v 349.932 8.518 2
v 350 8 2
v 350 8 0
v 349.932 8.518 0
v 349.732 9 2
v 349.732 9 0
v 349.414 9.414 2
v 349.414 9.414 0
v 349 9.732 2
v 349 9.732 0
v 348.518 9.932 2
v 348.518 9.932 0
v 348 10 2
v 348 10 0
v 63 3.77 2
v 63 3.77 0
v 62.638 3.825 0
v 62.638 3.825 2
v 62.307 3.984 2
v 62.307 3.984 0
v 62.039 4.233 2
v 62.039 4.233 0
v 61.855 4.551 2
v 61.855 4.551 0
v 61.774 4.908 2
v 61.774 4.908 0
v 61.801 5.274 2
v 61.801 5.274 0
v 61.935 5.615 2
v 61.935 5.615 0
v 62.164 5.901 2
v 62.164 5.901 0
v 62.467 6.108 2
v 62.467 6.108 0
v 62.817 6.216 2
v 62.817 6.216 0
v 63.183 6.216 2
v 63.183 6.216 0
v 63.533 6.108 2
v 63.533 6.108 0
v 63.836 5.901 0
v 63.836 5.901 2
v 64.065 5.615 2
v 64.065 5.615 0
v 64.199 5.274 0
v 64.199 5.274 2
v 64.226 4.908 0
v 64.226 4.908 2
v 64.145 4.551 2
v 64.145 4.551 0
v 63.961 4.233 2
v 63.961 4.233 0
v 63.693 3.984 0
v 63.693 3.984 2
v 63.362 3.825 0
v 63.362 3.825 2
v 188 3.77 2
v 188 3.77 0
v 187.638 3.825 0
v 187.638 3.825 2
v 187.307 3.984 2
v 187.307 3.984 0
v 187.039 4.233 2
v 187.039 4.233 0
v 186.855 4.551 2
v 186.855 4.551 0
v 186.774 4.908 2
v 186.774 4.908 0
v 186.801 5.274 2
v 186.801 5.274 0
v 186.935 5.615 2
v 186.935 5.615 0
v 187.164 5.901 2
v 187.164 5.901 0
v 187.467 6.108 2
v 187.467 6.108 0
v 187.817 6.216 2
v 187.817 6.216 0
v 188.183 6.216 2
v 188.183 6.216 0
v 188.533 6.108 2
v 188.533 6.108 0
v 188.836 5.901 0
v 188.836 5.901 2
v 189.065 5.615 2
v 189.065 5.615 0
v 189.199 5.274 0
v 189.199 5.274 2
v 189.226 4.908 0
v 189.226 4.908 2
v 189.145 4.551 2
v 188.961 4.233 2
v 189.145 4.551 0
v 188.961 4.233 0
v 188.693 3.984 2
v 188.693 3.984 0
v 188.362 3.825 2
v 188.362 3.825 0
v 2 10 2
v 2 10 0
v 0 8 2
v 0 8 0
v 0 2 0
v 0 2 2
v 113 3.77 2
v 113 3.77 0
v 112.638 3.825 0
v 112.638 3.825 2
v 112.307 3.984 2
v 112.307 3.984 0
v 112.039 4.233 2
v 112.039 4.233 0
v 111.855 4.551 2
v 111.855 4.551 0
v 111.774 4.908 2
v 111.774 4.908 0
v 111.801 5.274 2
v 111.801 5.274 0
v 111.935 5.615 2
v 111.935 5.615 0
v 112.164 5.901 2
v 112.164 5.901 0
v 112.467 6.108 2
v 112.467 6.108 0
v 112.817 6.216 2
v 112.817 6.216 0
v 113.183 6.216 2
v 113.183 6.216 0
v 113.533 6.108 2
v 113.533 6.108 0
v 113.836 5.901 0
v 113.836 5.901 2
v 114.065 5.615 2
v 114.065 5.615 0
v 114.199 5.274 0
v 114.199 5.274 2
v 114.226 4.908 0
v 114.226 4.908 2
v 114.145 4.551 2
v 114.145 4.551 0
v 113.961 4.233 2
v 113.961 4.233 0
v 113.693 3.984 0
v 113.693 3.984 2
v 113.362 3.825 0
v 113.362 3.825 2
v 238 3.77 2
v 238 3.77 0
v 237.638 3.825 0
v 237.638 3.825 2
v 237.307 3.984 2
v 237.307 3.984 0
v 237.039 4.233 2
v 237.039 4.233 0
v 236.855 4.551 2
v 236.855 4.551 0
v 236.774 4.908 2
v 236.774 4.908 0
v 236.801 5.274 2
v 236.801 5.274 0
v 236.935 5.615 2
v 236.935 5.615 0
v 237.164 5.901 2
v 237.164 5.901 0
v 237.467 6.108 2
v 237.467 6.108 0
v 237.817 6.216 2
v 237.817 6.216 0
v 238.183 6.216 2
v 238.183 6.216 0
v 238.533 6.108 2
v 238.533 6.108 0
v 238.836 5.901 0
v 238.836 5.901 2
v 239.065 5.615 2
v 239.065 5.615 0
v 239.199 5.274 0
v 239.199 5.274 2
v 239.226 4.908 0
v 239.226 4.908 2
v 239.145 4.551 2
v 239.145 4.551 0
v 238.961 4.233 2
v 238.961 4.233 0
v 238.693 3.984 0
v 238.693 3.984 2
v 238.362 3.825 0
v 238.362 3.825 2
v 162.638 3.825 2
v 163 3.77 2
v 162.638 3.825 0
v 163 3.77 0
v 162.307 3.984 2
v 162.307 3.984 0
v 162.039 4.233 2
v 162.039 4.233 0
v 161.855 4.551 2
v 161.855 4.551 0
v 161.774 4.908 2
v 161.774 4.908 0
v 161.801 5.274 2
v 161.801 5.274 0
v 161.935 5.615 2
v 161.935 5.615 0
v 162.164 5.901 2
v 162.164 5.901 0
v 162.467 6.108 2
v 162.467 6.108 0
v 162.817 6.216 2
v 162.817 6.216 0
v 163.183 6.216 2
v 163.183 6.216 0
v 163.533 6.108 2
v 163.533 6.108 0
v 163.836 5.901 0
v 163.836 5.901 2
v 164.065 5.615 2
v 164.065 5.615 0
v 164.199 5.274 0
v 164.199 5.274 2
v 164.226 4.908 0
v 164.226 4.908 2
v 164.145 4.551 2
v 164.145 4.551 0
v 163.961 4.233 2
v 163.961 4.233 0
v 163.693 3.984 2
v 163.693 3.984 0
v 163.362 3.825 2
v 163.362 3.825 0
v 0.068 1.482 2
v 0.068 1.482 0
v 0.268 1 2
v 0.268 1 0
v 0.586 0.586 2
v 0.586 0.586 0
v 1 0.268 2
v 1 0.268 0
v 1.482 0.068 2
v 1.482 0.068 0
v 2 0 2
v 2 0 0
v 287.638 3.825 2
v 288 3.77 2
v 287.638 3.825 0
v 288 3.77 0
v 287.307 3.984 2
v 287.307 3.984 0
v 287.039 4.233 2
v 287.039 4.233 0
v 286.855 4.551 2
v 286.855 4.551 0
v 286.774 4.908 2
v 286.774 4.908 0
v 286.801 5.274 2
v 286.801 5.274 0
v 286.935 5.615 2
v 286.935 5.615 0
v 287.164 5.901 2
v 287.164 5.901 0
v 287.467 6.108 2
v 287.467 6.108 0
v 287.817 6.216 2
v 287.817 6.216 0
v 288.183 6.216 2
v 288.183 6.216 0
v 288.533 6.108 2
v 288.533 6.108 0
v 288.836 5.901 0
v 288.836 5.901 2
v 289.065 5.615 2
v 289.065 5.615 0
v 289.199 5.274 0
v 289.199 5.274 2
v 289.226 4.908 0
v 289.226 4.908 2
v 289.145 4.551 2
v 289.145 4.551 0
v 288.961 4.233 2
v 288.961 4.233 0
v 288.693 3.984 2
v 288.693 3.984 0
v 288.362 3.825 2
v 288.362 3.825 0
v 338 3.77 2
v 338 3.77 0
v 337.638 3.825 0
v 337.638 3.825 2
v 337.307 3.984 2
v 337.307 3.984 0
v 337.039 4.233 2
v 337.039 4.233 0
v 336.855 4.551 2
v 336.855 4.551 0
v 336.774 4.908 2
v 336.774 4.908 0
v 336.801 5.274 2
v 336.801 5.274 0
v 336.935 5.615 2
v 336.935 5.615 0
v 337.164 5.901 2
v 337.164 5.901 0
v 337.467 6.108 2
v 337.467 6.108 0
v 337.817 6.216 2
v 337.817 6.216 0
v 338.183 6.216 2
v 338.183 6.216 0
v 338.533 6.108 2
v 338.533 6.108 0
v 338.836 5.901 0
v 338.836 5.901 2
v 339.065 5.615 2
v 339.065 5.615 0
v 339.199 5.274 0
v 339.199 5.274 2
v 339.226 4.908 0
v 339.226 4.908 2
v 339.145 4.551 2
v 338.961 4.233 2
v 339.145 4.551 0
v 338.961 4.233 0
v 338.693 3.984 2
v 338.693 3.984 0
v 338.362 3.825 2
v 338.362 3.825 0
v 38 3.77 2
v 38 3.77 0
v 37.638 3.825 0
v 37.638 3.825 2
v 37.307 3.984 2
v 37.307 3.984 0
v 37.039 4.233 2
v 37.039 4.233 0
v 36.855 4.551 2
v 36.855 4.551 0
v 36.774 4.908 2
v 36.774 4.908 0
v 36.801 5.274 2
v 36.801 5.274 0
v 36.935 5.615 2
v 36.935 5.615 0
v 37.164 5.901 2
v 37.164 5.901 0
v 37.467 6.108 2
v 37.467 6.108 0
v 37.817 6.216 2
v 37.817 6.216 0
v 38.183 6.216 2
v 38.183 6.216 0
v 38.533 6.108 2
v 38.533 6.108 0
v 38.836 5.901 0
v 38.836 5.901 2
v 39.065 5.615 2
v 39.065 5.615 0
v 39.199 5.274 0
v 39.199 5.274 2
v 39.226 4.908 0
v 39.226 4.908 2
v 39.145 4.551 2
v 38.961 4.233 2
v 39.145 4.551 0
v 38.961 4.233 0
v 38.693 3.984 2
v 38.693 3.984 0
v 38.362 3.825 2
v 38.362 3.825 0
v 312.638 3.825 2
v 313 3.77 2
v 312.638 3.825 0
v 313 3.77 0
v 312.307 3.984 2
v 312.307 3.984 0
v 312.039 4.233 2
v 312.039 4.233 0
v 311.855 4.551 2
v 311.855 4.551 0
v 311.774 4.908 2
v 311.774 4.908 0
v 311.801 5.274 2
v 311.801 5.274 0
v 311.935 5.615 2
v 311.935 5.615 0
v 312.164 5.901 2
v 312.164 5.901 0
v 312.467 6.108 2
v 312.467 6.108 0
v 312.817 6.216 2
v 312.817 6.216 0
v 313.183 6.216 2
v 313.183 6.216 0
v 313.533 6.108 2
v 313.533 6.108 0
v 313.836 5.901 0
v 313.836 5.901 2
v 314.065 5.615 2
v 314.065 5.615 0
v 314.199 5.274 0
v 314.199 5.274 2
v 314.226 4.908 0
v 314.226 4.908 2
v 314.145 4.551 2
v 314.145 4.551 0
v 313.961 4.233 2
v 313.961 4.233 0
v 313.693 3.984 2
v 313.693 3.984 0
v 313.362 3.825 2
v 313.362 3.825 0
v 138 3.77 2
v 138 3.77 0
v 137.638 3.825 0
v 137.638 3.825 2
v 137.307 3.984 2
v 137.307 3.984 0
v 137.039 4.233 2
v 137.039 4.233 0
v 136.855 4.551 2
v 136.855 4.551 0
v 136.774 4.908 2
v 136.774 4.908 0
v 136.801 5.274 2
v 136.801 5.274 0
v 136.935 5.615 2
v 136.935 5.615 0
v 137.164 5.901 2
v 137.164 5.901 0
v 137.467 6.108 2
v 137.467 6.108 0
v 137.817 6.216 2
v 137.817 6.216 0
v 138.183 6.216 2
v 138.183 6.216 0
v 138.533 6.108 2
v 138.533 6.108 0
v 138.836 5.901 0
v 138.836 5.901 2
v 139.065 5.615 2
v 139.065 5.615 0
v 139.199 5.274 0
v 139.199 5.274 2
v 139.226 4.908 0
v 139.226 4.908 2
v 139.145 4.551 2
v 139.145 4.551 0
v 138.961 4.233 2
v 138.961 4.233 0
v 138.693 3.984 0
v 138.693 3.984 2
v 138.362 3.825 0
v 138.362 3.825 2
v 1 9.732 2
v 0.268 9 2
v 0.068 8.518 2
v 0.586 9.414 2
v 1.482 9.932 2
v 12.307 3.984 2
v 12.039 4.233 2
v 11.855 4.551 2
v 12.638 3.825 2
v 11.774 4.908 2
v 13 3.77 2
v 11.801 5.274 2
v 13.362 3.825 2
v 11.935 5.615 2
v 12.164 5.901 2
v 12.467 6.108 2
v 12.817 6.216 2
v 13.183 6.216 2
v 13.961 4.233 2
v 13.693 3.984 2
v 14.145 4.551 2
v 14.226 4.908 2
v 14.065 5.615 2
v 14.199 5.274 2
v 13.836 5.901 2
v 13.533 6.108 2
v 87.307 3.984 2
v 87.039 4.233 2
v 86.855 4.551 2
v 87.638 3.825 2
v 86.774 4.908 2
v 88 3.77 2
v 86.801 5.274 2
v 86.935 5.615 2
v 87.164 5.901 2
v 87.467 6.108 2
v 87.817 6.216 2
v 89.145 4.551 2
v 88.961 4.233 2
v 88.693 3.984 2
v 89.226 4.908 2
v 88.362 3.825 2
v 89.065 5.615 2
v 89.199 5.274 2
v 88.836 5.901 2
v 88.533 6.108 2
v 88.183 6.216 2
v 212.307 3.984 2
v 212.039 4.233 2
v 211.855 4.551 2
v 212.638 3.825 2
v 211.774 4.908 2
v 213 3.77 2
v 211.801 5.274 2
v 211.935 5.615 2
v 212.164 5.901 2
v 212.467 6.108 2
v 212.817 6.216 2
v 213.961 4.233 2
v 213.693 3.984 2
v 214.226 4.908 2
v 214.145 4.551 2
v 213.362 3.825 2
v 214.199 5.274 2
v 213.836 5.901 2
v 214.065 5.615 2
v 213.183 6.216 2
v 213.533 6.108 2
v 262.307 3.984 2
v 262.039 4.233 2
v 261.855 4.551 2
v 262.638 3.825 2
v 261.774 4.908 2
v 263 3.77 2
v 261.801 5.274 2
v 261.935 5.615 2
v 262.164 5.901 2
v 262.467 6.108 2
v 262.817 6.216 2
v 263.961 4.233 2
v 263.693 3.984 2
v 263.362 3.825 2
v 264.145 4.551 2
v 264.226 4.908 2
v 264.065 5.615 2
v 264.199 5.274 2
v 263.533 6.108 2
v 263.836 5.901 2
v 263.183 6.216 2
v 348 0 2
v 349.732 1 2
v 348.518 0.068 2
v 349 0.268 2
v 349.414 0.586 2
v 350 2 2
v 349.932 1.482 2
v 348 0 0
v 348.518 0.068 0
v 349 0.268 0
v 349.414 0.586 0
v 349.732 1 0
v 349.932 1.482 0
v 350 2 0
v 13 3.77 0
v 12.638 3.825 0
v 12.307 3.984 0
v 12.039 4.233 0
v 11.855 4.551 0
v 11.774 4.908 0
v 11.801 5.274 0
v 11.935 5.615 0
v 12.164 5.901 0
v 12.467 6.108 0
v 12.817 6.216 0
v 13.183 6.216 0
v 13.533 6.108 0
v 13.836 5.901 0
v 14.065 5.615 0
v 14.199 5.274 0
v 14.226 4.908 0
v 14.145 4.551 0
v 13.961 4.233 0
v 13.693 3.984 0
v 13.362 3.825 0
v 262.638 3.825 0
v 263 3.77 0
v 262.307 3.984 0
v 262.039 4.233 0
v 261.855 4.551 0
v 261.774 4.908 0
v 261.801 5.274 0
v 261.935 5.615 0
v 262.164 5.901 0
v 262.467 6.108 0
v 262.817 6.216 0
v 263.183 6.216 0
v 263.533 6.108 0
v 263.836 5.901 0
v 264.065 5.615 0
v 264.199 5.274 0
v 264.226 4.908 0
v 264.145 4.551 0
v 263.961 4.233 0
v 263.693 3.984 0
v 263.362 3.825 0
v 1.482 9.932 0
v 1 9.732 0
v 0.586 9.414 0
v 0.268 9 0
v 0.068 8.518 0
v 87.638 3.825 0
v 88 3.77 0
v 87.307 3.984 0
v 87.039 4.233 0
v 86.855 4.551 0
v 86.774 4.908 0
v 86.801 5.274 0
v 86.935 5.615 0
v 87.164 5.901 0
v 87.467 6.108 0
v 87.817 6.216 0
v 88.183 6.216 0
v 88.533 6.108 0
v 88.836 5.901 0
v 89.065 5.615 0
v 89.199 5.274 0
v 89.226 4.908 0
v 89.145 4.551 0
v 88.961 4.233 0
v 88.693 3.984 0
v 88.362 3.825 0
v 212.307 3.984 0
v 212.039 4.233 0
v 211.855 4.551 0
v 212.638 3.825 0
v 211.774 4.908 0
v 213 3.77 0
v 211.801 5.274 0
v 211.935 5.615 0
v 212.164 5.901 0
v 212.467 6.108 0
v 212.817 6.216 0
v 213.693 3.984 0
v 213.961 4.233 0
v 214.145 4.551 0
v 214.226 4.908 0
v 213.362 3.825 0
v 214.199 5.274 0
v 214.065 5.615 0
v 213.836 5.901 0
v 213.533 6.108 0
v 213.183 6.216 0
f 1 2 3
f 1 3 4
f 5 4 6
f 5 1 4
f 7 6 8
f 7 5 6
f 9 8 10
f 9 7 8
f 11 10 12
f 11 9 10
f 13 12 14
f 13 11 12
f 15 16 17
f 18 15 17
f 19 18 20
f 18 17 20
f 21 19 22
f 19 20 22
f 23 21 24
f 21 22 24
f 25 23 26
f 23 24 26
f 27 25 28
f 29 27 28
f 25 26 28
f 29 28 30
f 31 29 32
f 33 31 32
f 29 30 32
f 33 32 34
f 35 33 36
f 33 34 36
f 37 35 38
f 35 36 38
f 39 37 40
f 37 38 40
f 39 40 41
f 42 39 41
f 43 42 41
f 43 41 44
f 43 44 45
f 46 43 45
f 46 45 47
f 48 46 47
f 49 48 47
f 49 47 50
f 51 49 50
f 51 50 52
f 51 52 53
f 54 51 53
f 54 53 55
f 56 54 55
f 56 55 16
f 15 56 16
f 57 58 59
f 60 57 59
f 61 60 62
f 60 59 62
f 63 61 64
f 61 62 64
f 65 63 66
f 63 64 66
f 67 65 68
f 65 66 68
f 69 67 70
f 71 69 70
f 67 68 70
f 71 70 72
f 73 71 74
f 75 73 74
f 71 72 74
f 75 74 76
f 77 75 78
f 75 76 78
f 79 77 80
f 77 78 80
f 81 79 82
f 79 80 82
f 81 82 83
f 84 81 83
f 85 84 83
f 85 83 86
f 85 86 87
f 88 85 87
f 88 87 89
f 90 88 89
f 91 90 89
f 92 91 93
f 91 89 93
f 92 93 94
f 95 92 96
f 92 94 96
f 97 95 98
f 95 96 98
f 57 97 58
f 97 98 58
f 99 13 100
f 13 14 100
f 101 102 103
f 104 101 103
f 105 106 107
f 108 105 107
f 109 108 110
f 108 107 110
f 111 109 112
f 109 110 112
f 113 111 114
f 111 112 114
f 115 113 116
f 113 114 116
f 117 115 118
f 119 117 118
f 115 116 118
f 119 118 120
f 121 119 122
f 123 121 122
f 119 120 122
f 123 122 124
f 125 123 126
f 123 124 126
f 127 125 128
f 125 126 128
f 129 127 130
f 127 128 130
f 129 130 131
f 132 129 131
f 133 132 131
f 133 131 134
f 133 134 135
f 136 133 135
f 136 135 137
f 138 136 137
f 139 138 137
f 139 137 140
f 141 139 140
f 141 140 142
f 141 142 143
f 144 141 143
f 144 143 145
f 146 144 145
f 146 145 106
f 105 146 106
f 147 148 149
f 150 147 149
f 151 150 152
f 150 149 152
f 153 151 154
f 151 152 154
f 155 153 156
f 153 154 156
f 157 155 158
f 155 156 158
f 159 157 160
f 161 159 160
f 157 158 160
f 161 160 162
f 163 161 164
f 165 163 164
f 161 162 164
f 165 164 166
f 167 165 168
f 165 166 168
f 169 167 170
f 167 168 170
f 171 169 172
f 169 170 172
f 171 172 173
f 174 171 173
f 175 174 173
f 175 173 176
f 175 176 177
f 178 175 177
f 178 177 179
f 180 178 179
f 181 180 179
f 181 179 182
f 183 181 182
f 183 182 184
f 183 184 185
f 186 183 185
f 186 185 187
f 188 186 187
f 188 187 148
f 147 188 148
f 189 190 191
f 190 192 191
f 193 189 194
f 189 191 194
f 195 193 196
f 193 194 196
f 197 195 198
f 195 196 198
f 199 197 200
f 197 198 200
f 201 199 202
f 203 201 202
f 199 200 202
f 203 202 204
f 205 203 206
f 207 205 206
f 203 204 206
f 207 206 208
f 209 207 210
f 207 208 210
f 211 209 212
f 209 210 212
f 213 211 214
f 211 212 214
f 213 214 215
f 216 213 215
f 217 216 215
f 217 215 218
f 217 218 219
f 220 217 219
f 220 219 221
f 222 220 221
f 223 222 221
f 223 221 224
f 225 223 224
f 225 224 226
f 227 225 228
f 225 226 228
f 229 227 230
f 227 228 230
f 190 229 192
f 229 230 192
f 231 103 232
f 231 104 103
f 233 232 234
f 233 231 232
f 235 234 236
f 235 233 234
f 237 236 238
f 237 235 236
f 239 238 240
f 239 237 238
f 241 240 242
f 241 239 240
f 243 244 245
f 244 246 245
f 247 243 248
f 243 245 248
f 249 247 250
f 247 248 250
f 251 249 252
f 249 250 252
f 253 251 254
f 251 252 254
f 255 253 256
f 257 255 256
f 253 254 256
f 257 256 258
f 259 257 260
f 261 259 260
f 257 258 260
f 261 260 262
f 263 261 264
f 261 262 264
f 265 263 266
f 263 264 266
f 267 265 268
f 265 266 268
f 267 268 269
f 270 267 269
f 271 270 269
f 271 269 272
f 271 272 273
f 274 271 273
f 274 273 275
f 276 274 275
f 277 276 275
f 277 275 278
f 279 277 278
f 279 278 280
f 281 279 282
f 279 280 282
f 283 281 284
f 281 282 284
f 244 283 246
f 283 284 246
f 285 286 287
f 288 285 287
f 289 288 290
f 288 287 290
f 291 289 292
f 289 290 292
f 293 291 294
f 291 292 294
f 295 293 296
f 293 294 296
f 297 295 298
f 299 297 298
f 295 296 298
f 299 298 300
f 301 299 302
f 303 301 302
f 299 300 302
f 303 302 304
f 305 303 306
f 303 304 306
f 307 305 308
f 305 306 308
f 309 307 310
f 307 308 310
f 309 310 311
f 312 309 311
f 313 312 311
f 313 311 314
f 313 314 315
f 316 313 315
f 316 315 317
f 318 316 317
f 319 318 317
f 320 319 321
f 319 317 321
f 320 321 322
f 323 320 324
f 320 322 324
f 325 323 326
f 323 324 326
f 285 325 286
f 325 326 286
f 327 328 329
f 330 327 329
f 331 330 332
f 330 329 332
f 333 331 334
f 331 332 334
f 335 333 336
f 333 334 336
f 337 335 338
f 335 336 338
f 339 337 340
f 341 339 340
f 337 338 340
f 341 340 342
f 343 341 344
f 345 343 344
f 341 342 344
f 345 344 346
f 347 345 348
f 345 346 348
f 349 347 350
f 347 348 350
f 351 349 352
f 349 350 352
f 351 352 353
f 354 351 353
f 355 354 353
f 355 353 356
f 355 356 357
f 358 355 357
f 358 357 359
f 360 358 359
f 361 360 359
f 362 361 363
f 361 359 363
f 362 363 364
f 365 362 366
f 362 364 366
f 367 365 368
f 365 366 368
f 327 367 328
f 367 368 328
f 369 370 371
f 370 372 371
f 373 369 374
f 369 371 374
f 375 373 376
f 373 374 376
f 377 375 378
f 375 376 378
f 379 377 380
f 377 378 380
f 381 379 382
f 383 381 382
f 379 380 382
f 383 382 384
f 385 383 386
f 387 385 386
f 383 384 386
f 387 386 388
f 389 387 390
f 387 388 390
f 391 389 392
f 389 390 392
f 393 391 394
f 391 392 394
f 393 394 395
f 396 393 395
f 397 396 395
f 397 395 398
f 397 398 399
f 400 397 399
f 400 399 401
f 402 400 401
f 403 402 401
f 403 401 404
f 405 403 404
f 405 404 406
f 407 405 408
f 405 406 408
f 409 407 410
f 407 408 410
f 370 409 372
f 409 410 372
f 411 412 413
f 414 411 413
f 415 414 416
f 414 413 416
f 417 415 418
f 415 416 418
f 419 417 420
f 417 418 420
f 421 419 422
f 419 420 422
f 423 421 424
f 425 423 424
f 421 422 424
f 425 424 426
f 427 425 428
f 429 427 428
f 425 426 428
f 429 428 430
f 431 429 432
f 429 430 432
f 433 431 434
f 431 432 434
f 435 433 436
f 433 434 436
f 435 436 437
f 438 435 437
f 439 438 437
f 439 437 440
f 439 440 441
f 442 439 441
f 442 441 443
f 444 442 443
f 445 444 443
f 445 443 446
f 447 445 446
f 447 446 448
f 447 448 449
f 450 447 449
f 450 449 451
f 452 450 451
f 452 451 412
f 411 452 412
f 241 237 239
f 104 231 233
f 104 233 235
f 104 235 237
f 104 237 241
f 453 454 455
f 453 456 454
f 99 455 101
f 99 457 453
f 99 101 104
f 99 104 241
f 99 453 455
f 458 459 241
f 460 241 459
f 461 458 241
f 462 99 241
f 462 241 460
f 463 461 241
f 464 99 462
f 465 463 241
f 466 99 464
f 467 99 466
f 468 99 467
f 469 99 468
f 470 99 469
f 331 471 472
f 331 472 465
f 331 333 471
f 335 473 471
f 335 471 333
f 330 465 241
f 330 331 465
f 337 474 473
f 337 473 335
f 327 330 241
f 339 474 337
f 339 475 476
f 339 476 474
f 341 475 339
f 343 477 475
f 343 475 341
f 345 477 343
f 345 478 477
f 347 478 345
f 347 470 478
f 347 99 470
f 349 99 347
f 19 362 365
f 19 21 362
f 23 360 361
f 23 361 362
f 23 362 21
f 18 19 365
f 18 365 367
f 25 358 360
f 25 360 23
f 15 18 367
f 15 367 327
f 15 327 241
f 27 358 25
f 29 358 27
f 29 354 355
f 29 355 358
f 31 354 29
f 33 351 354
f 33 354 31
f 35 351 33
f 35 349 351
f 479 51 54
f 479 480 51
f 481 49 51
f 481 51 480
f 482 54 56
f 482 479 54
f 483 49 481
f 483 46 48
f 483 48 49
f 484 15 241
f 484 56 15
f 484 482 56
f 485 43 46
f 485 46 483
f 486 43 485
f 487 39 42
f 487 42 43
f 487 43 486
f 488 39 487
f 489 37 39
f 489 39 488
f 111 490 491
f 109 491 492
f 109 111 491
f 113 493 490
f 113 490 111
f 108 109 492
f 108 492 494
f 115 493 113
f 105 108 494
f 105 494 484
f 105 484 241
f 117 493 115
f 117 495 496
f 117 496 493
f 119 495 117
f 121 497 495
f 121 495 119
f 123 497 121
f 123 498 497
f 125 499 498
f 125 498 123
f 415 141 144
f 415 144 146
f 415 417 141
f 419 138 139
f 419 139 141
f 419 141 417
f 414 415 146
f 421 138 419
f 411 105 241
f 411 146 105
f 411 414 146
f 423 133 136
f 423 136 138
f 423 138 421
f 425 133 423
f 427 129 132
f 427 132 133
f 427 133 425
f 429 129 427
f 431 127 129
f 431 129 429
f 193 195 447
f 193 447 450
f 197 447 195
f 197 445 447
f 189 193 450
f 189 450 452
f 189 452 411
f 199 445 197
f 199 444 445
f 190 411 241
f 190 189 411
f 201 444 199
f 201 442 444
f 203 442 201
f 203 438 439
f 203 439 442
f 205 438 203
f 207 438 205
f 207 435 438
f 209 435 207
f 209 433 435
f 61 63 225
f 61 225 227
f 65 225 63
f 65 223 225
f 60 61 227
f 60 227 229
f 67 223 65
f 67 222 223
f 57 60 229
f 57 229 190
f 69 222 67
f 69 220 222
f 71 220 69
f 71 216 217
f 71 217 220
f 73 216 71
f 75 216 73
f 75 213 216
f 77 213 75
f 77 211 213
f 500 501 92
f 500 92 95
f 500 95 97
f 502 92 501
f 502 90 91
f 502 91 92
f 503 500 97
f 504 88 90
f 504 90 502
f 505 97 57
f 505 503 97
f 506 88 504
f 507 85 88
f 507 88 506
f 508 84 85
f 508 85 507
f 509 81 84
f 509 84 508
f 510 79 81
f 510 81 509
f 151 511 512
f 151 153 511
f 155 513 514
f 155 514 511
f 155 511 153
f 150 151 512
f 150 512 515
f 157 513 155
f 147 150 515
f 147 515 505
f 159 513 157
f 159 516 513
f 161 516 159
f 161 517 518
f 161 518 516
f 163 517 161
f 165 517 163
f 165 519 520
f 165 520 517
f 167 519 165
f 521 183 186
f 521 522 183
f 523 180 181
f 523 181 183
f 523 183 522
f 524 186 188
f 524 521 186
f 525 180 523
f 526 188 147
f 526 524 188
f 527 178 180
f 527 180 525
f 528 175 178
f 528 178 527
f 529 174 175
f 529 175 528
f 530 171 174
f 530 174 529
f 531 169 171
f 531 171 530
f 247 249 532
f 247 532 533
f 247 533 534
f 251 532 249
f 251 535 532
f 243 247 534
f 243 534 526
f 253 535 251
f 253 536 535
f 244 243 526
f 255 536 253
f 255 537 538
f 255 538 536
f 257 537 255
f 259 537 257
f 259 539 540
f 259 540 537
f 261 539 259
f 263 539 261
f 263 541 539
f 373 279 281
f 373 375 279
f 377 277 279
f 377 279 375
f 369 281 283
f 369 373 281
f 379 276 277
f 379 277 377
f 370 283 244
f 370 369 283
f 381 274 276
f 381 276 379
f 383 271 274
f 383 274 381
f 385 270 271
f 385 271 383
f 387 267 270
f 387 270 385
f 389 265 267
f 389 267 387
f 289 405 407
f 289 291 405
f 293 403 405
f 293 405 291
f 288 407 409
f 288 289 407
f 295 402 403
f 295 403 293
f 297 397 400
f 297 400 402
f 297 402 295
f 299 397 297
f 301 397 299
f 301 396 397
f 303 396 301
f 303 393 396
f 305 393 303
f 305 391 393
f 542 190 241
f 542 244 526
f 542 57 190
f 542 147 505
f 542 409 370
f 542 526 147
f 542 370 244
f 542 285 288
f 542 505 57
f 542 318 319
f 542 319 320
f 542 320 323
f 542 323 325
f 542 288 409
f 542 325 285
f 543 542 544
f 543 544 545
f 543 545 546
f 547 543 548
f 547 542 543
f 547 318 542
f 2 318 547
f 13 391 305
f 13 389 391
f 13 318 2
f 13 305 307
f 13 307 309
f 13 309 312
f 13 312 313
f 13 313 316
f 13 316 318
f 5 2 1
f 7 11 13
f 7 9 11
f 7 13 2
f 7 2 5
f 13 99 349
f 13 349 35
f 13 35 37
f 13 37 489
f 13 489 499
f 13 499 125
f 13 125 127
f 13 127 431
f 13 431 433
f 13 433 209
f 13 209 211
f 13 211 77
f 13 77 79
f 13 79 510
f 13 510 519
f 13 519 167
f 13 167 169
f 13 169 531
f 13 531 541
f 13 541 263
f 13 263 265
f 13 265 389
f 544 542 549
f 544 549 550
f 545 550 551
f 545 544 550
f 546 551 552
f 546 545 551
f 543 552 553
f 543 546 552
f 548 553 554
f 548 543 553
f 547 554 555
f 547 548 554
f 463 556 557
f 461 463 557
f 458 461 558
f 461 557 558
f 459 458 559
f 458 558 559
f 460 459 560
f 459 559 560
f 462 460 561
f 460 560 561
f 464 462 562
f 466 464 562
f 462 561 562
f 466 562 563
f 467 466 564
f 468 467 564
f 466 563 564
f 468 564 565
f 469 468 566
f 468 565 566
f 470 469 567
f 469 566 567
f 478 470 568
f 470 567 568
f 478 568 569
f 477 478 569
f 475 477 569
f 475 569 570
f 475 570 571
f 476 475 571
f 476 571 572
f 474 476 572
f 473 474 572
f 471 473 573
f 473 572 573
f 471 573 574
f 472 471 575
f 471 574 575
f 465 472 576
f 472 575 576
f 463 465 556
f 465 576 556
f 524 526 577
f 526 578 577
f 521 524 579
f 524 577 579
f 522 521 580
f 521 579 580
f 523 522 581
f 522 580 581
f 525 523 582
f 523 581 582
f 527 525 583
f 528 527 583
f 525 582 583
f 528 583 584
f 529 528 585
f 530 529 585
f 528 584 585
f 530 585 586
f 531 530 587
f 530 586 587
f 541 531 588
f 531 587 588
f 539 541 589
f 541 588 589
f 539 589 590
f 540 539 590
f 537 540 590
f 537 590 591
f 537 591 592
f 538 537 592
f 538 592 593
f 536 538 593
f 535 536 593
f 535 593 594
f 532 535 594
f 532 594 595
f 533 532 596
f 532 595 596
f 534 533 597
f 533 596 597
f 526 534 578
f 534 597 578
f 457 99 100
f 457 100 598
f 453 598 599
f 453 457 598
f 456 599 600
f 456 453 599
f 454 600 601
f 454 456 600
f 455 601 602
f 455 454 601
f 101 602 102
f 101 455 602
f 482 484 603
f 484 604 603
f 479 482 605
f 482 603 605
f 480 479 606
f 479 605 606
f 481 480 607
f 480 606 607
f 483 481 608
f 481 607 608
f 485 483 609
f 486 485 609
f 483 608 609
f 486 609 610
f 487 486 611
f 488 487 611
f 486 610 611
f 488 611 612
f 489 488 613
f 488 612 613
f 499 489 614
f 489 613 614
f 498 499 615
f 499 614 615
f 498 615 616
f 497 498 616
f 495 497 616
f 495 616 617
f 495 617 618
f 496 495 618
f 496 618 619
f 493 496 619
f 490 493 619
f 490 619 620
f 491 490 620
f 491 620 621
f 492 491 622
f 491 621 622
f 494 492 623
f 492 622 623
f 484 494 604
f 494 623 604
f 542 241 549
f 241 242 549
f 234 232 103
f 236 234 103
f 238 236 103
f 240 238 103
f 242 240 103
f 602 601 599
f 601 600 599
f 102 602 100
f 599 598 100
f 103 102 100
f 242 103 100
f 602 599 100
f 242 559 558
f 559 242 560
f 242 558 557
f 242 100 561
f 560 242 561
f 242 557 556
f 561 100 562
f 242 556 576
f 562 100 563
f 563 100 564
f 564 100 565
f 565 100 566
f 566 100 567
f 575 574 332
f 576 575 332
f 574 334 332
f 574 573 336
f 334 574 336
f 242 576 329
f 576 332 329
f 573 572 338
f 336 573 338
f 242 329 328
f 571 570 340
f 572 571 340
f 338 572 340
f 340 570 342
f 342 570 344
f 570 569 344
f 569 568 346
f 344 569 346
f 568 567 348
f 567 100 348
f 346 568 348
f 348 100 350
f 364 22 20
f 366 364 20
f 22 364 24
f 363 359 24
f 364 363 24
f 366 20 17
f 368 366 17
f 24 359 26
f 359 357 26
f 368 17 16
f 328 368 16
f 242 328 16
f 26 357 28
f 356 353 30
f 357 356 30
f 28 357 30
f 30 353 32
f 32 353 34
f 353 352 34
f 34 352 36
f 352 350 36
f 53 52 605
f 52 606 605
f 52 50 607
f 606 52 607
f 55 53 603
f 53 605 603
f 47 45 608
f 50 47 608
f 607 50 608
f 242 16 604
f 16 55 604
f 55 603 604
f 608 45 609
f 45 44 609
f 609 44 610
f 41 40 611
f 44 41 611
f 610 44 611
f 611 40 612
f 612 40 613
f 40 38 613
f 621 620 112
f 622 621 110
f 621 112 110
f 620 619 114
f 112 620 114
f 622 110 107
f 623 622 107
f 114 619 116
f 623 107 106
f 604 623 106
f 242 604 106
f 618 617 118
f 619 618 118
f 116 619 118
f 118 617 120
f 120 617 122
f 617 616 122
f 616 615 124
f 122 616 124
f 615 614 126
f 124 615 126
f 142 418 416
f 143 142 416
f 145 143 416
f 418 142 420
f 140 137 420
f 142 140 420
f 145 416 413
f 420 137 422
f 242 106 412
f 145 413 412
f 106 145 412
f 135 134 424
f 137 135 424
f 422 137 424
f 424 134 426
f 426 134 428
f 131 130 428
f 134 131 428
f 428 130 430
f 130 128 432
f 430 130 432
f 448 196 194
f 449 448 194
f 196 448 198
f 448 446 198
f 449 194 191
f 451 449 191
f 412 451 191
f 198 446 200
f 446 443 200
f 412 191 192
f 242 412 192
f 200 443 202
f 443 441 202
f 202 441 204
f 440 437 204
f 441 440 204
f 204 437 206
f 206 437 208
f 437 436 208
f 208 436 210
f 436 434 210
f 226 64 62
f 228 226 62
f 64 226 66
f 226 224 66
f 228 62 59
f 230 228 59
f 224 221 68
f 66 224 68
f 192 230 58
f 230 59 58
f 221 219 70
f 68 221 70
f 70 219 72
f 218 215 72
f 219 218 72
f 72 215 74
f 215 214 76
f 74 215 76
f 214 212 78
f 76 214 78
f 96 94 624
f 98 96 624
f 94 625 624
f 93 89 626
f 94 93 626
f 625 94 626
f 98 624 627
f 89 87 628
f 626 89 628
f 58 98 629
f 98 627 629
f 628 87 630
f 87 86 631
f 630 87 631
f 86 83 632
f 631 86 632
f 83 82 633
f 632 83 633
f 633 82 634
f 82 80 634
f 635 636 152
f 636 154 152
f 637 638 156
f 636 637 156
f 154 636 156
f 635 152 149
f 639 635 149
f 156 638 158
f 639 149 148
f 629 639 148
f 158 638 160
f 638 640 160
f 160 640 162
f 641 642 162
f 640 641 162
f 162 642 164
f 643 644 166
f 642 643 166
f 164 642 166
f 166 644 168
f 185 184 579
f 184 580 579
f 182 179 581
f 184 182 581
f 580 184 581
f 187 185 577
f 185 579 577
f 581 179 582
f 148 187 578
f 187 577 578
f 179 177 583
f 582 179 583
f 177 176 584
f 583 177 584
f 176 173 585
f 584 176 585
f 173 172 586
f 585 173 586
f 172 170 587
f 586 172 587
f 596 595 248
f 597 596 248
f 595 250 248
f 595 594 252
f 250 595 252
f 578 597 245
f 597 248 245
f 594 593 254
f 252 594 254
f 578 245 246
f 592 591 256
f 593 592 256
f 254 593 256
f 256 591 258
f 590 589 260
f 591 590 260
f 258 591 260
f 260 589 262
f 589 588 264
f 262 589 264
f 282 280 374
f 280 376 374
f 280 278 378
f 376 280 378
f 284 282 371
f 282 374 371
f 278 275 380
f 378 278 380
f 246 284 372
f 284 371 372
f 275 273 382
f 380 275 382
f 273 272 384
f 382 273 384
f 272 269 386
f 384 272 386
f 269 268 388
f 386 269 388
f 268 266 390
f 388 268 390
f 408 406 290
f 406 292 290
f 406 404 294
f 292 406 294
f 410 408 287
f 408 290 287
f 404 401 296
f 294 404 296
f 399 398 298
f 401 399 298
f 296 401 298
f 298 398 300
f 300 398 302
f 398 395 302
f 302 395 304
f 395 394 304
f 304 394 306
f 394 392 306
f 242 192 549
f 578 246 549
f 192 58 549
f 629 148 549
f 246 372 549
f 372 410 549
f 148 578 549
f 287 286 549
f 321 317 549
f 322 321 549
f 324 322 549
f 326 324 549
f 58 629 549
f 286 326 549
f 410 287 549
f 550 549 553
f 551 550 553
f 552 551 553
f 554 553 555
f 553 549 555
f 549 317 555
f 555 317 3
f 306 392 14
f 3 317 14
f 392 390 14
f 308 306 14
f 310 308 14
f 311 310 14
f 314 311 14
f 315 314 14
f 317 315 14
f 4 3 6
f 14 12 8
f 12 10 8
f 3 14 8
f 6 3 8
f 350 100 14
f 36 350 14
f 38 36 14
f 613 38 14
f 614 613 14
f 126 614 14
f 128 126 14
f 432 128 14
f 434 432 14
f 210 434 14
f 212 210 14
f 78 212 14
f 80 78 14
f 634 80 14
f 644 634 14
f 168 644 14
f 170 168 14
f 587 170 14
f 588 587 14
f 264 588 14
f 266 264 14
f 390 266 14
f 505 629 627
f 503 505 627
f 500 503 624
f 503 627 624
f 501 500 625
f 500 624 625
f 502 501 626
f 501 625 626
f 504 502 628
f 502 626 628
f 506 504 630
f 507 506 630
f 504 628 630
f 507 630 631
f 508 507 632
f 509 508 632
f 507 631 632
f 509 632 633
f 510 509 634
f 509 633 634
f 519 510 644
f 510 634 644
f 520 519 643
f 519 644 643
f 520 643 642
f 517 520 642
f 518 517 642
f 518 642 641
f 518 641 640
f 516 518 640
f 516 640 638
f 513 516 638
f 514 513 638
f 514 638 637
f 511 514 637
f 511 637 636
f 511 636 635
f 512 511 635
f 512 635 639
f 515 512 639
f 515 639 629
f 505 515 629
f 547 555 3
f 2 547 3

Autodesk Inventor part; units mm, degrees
ref_plane "YZ Plane" through (0, 0, 0) normal (1, 0, 0) x (0, 1, 0)
ref_plane "XZ Plane" through (0, 0, 0) normal (0, 1, 0) x (-1, 0, 0)
ref_plane "XY Plane" through (0, 0, 0) normal (0, 0, 1) x (1, 0, 0)
sketch "Sketch1" plane through (0, 0, 0) normal (0, 0, 1) x (1, 0, 0)
  line L0 (0, 0) -> (350, 0)
  line L1 (350, 0) -> (350, 10)
  line L2 (350, 10) -> (0, 10)
  line L3 (0, 10) -> (0, 0)
  dimension "d0" = 350
  dimension "d1" = 10
extrude "Extrusion1" add sketch "Sketch1" along normal blind 2
sketch "Sketch2" plane through (0, 0, 2) normal (0, 0, 1) x (1, 0, 0)
  line L0 (0, 10) -> (0, 0) projected
  point P0 (13, 5)
  point P1 (0, 5)
  dimension "d4" = 13
hole "Hole1" at (13, 5, 2) direction (0, 0, -1) diameter 2.459 end through all thread size "M3x0.5" class "6H" standard "ANSI Metric M Profile"
pattern_linear "Rectangular Pattern1" count 14 spacing 25 along (1, 0, 0) of "Hole1"
fillet "Fillet1" radius 2 4 edges at (0, 0, 1) (0, 10, 1) (350, 0, 1) (350, 10, 1)
properties part number "Linear Rail Screw Plate"
